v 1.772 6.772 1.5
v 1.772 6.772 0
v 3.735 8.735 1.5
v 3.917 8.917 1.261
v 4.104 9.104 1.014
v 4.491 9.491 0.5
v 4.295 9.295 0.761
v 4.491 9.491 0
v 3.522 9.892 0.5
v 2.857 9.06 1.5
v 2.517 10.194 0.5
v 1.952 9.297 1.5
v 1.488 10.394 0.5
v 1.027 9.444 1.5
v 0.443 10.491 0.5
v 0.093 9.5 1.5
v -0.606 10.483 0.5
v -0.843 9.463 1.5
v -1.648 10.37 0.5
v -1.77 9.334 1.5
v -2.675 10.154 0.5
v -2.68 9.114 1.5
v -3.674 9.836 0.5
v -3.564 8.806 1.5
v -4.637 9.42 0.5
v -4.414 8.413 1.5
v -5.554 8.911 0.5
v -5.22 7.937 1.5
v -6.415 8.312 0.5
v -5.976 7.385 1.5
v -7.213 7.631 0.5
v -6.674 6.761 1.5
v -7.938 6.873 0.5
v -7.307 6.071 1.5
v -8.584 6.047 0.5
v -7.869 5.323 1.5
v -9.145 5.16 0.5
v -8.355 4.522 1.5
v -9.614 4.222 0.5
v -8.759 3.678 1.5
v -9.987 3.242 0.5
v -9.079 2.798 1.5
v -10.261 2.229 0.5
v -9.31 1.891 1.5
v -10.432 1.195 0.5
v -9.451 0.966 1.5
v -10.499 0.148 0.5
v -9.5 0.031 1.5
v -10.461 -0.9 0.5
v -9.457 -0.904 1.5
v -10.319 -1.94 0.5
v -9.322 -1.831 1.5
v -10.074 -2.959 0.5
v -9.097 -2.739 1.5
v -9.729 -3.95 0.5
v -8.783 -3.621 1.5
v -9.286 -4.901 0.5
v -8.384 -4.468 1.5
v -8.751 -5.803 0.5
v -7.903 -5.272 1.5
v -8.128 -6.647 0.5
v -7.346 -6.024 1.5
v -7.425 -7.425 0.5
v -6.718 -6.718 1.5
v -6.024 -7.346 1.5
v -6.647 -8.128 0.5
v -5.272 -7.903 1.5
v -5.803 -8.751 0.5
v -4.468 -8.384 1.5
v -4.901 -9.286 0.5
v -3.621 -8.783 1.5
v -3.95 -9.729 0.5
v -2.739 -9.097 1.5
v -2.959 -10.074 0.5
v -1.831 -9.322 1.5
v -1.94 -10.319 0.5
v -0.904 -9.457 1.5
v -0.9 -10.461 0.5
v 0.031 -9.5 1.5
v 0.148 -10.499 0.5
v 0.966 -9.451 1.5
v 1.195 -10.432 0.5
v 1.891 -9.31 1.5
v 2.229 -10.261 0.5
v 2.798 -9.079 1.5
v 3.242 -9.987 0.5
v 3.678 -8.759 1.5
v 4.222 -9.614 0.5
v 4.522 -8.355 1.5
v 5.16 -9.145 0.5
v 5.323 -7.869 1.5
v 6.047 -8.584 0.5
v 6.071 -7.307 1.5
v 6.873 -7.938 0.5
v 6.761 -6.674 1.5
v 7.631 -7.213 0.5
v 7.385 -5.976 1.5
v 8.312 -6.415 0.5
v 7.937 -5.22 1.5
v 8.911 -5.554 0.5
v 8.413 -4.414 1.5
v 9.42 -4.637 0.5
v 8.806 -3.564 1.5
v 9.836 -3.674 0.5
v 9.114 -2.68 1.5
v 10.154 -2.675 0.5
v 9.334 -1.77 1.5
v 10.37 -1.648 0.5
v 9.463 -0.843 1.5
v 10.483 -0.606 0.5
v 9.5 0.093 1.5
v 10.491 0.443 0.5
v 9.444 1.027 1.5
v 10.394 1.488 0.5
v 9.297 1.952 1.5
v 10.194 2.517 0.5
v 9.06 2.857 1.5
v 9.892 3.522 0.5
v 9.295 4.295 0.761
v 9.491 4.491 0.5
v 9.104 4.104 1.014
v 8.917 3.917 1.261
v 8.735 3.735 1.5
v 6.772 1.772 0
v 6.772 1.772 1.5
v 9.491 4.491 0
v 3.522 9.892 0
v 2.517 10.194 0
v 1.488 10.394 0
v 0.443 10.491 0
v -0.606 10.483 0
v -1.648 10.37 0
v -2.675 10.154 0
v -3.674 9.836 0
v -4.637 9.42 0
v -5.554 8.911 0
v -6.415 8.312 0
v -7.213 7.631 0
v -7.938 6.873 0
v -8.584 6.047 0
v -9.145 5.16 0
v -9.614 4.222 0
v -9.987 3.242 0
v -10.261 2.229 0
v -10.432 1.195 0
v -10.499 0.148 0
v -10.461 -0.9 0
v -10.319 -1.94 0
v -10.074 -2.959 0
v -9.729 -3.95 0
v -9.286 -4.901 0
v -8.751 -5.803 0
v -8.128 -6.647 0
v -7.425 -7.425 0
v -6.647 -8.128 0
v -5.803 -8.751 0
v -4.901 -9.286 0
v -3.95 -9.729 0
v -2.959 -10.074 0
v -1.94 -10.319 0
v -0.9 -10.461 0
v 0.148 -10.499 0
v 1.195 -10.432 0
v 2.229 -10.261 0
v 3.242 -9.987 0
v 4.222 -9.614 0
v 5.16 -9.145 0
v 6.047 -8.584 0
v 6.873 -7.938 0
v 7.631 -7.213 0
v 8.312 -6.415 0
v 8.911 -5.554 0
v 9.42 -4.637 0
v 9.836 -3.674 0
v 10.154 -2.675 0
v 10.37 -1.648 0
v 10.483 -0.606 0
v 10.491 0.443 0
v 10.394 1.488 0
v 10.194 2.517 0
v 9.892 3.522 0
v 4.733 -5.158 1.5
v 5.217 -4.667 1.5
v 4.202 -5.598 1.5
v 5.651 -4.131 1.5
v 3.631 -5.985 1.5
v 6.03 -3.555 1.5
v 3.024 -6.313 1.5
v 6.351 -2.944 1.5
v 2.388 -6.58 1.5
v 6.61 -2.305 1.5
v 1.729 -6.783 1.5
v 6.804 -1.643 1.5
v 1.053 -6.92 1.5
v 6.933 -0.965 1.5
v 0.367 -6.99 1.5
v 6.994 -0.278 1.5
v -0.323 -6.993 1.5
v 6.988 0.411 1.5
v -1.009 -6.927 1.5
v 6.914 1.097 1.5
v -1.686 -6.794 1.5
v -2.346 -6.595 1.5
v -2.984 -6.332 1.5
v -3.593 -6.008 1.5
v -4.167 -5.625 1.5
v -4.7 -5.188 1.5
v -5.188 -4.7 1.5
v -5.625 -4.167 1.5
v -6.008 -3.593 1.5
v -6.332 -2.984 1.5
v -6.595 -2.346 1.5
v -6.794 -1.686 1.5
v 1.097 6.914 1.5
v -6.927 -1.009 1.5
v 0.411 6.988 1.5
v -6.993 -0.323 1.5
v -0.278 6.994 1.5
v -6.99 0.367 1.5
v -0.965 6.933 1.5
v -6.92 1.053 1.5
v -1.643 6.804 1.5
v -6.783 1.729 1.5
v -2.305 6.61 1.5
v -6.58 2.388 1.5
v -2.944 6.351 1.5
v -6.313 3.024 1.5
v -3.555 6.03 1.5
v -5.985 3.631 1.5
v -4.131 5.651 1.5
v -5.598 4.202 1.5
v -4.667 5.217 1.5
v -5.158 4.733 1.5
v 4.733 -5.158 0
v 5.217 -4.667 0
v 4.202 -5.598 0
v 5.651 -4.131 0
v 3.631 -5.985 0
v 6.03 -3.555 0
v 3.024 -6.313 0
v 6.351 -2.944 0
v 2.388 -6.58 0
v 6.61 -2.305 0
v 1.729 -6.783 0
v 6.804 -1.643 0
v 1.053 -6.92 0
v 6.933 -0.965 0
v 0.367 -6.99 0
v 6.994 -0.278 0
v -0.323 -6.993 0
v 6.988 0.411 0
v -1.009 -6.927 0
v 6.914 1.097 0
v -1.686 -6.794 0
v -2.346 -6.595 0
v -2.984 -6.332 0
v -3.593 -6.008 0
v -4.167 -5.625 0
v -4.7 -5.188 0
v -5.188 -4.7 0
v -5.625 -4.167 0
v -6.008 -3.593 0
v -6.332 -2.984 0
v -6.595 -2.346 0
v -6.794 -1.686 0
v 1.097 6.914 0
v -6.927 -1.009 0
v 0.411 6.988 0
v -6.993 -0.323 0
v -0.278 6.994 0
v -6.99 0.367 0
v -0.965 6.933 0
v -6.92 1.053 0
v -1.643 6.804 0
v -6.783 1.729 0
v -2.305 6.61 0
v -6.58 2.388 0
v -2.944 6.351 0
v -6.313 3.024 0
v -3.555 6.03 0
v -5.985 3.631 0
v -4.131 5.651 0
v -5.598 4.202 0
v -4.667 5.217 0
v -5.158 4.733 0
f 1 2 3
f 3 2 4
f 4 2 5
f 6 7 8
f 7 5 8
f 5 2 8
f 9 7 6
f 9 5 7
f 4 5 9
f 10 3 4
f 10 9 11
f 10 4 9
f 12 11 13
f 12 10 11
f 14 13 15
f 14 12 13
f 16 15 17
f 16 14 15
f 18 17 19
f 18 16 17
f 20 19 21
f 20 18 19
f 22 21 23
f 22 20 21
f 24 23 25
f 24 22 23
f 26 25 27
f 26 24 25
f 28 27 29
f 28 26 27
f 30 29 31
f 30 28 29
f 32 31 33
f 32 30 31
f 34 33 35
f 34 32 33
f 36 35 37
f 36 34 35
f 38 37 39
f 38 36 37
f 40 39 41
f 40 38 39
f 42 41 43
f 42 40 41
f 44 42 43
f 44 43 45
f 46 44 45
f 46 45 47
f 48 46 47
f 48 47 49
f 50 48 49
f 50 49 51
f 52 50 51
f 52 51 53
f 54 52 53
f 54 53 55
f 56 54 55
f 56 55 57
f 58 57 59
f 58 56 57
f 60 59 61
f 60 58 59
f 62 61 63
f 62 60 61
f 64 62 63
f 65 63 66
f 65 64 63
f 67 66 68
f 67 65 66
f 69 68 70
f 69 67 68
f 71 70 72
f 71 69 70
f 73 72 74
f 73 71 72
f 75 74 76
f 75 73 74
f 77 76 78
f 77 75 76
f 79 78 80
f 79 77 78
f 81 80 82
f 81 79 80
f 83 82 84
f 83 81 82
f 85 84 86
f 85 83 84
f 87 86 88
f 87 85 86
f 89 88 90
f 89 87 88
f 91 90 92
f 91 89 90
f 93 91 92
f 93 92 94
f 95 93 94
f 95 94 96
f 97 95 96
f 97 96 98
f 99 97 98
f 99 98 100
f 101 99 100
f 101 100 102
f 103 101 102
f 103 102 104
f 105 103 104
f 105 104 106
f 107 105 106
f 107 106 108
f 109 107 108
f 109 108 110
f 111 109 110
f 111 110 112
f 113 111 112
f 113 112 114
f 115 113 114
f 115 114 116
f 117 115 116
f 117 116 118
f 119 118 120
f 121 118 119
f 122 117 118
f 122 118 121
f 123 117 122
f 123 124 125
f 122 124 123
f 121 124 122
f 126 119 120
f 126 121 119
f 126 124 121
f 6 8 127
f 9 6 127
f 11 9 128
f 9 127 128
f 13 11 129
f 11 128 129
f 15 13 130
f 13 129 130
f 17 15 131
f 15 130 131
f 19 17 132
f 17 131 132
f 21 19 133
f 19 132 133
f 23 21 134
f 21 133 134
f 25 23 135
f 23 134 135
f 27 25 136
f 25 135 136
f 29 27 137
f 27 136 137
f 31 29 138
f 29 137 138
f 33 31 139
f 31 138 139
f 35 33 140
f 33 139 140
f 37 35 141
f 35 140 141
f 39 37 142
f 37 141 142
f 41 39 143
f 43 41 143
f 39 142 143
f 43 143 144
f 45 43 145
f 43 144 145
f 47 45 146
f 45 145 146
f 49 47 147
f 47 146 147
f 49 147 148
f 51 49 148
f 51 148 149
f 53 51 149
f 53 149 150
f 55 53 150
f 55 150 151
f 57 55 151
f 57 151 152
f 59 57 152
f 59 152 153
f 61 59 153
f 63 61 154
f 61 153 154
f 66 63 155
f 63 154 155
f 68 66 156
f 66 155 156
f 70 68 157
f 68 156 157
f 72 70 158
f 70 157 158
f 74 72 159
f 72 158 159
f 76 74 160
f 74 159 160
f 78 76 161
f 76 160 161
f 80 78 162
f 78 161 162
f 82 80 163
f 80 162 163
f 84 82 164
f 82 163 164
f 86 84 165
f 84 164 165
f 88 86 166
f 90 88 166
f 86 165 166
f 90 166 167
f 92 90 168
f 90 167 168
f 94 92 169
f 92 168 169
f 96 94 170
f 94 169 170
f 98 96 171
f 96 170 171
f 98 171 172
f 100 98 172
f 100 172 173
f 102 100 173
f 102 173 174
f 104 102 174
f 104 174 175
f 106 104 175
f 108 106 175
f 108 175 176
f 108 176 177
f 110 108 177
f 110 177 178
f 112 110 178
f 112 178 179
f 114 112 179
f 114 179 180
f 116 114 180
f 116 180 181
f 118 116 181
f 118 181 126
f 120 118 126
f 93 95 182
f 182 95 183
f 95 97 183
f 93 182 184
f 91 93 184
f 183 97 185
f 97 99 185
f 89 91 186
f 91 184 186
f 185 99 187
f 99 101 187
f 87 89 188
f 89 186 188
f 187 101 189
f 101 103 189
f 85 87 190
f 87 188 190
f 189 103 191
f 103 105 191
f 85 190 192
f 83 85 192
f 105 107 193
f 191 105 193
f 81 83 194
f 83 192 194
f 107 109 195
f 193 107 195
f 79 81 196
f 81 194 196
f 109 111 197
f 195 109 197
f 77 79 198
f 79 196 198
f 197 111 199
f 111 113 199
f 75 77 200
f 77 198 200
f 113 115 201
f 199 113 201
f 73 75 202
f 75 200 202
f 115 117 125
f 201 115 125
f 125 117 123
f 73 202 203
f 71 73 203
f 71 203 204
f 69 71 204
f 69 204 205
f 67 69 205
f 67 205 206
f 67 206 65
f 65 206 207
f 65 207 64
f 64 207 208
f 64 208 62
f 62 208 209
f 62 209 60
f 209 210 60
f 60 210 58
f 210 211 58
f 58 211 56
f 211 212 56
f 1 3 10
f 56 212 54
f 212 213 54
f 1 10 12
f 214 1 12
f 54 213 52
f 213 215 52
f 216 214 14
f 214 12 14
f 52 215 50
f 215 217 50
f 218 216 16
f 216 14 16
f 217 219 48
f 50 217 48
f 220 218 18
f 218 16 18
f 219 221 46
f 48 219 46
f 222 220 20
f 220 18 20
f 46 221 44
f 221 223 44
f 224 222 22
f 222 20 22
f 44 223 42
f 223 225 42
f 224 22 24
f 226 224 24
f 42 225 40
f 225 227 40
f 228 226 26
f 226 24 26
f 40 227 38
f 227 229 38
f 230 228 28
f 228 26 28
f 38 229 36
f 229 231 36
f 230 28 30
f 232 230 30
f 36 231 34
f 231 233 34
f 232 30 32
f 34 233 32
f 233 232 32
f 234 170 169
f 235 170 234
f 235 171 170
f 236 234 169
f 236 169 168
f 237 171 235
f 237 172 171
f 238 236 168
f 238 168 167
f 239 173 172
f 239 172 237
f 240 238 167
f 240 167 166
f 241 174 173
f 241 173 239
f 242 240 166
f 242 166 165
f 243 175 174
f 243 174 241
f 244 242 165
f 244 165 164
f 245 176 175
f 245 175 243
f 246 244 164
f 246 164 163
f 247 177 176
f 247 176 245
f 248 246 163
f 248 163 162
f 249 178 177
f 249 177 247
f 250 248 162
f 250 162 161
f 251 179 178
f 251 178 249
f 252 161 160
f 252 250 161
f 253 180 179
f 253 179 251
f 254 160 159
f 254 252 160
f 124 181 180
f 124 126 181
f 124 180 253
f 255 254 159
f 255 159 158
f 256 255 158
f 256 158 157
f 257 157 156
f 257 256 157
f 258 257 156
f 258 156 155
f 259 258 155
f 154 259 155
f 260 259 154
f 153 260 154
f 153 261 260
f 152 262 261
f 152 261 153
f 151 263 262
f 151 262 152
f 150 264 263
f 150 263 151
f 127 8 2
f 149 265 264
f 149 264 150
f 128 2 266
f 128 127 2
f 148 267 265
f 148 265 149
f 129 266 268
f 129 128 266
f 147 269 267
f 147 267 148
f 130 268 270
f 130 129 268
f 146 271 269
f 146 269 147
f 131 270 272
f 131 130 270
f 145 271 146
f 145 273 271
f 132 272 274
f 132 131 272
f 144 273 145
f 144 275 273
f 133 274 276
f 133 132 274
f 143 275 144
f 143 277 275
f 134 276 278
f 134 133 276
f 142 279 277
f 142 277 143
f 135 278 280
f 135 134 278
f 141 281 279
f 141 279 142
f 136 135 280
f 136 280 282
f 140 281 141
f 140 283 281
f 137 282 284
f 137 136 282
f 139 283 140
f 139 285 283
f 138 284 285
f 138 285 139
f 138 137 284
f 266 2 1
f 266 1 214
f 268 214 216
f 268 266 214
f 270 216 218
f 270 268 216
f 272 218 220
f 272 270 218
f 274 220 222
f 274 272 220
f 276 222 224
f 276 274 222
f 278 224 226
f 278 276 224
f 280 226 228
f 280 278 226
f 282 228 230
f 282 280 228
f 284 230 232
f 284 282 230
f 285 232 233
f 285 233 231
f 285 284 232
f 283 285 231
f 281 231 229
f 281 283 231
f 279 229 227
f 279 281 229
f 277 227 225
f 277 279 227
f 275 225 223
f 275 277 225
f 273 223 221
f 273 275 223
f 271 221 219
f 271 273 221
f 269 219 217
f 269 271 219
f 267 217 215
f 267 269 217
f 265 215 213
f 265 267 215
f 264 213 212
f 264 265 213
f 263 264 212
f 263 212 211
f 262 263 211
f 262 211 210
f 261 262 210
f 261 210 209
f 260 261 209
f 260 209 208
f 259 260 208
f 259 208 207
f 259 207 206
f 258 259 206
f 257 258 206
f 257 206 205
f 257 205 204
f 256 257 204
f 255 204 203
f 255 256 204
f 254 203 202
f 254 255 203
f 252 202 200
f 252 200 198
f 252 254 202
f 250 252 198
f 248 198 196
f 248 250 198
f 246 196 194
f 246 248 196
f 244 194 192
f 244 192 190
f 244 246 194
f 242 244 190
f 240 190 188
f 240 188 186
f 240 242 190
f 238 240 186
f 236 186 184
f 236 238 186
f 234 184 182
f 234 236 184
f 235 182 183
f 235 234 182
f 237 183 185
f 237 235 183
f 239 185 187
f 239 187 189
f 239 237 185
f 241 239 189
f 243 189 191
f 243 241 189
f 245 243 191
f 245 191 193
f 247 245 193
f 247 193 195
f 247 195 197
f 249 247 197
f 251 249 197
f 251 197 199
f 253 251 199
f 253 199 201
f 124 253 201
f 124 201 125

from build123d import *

# Parameters (mm, degrees)
PAD_DEPTH    = 1.5
CHAMFER_SIZE = 1


with BuildPart() as part:
    # Sketch → Pad (new body)
    with BuildSketch(Plane.XY):
        with BuildLine():
            ThreePointArc((1.772002, 6.772002), (-4.949747, -4.949747), (6.772002, 1.772002))
            Line((6.772002, 1.772002), (9.491066, 4.491066))
            ThreePointArc((4.491066, 9.491066), (-7.424621, -7.424621), (9.491066, 4.491066))
            Line((1.772002, 6.772002), (4.491066, 9.491066))
        make_face()
    extrude(amount=PAD_DEPTH)

    # Chamfer
    chamfer_edges = [part.edges().sort_by_distance(p)[0] for p in [
        (-7.424621, -7.424621, 1.5),
    ]]
    chamfer(chamfer_edges, length=CHAMFER_SIZE)


solid = part.part
